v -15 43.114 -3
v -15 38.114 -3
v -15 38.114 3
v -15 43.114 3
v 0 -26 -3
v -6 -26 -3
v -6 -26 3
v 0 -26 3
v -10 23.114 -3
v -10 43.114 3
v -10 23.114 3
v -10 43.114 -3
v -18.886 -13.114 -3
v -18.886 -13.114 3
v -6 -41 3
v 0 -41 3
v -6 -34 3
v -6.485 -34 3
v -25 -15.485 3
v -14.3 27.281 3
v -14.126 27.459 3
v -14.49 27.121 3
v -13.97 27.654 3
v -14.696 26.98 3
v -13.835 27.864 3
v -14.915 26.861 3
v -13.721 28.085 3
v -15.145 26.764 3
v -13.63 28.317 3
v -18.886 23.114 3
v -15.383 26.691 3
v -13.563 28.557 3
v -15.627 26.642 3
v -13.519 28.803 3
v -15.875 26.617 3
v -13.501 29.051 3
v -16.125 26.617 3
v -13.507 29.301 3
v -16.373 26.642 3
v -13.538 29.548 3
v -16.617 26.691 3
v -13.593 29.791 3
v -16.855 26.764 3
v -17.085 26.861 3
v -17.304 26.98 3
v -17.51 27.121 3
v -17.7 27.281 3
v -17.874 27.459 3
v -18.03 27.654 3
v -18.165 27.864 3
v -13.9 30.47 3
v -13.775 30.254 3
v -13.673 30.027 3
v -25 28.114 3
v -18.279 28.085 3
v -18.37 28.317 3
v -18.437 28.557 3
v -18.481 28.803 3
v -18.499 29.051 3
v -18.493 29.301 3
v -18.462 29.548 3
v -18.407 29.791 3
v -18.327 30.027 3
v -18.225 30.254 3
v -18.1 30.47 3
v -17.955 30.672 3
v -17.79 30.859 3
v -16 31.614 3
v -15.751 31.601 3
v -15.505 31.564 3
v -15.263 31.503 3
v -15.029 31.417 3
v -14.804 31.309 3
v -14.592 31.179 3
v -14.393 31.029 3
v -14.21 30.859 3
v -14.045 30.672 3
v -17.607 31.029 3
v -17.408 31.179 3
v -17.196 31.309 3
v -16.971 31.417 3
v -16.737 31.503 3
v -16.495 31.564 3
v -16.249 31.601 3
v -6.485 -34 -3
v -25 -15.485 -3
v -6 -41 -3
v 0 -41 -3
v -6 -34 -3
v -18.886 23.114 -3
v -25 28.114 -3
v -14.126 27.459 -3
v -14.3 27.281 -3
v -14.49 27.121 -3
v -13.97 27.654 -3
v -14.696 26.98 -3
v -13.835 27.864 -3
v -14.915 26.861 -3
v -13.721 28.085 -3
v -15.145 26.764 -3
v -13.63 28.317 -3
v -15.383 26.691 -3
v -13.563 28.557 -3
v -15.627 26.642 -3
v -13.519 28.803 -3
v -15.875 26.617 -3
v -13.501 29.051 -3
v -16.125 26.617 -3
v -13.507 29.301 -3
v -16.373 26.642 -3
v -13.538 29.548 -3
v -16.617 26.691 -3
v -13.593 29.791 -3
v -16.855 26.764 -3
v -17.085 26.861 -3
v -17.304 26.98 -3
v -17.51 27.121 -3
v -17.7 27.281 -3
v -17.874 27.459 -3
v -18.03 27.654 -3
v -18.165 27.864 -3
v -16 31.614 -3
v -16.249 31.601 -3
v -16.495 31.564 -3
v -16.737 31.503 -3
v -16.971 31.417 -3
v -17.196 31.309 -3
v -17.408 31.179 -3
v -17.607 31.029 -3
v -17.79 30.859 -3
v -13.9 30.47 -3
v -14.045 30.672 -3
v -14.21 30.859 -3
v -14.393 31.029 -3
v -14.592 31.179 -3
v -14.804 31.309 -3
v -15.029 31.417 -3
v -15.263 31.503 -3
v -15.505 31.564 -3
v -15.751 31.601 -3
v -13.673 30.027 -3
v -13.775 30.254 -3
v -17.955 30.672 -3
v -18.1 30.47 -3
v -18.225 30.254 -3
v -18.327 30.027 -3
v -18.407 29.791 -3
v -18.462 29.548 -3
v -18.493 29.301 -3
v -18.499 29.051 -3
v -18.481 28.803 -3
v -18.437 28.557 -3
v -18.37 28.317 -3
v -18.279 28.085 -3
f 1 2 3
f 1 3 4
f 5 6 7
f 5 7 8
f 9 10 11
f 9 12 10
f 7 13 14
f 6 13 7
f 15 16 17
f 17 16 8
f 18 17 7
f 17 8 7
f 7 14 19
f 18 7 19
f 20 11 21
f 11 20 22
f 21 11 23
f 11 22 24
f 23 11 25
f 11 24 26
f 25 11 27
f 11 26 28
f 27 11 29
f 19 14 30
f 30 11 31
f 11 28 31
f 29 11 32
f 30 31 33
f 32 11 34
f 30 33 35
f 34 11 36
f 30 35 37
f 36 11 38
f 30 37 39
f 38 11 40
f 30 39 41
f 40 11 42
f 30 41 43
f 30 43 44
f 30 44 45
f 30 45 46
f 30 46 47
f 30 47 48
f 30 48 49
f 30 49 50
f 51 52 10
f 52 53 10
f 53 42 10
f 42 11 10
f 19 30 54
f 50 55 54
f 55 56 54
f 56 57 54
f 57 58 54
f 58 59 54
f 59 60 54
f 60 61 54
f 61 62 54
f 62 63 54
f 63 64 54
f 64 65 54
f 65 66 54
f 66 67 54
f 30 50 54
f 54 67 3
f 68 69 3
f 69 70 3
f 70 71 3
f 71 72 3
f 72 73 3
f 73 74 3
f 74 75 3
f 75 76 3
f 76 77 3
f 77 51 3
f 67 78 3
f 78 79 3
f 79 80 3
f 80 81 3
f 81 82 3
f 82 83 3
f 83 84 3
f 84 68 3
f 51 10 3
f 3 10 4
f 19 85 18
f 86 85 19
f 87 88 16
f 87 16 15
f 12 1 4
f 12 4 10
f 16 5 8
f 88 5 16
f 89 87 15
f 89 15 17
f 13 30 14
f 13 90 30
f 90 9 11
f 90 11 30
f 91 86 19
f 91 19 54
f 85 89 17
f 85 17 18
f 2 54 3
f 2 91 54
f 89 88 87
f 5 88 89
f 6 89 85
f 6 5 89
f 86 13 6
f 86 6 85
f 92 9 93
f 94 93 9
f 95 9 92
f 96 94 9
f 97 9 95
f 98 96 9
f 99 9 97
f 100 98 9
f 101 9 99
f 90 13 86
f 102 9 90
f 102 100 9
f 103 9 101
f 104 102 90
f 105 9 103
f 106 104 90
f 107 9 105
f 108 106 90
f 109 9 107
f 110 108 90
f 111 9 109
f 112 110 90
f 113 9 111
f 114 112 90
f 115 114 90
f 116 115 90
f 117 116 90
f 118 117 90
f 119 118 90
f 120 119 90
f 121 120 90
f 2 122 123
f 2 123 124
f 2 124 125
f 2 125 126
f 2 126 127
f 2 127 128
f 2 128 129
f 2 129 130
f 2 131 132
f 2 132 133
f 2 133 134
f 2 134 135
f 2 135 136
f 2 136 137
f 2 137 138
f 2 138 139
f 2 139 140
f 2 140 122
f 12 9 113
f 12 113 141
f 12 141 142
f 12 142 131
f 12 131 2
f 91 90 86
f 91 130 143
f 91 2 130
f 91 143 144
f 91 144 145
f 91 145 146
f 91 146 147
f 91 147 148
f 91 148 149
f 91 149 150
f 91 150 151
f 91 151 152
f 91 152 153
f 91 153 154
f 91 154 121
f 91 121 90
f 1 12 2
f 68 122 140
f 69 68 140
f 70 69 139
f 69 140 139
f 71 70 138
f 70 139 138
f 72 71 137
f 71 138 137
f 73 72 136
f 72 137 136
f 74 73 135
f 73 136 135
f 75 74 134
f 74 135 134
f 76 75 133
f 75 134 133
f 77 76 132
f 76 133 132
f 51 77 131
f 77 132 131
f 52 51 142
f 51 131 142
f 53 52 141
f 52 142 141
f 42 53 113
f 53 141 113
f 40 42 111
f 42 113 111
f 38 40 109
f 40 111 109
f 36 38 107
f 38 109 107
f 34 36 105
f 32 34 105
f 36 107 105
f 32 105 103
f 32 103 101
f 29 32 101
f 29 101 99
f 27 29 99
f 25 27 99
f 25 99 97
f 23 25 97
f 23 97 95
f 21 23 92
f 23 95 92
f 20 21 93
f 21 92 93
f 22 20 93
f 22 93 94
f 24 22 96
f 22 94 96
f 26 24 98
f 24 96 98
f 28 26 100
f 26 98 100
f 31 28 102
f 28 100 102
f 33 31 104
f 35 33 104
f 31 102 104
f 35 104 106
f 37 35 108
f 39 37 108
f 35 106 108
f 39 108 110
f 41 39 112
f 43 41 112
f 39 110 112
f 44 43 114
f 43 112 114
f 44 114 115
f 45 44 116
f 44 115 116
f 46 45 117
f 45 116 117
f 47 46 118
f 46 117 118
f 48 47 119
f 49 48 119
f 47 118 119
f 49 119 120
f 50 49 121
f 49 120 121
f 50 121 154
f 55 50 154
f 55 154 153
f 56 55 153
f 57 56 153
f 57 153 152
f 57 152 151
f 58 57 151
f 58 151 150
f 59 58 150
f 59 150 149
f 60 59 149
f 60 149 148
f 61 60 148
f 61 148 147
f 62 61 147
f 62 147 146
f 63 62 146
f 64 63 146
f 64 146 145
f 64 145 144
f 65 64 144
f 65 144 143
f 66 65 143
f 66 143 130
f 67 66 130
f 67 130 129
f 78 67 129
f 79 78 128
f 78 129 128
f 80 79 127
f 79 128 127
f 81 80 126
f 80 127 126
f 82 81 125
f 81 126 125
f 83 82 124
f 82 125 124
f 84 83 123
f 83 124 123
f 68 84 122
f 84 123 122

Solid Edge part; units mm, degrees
sketch "Sketch1" plane through (0, 0, 0) normal (0, 0, 1) x (1, 0, 0)
  line L0 (0, 34) -> (0, 26)
  line L1 (0, 26) -> (-6, 26)
  line L2 (-6, 26) -> (-18.8863, 13.1137)
  line L3 (-18.8863, 13.1137) -> (-18.8863, -13.1137)
  line L4 (-18.8863, -13.1137) -> (-6, -26)
  line L5 (-6, -26) -> (0, -26)
  line L6 (0, -26) -> (0, -34)
  line L7 (0, -34) -> (-6.4853, -34)
  line L8 (-6.4853, -34) -> (-25, -15.4853)
  line L9 (-25, -15.4853) -> (-25, 15.4853)
  line L10 (-25, 15.4853) -> (-6.4853, 34)
  line L11 (-6.4853, 34) -> (0, 34)
  dimension "D1" = 6
  dimension "D2" = 6
  dimension "D3" = 8
  dimension "D4" = 25
  dimension "D5" = 52
extrude "Protrusion1" add sketch "Sketch1" along normal mid plane 6
sketch "Sketch2" plane through (0, 0, 0) normal (0, 0, 1) x (1, 0, 0)
  line L0 (-6, -26) -> (0, -26)
  line L1 (0, -26) -> (0, -41)
  line L2 (0, -41) -> (-6, -41)
  line L3 (-6, -41) -> (-6, -26)
  dimension "D1" = 15
extrude "ExtrudedProtrusion_2" add sketch "Sketch2" along normal mid plane 6
sketch "Sketch3" plane through (-12.2288, -3.5, -3) normal (0, 0, -1) x (0, 1, 0)
  line L0 (16.6137, -6.6575) -> (16.6137, -12.7712)
  line L1 (16.6137, -12.7712) -> (18.9853, -12.7712)
  line L2 (18.9853, -12.7712) -> (37.5, 5.7435)
  line L3 (37.5, 5.7435) -> (37.5, 12.2288)
  line L4 (37.5, 12.2288) -> (29.5, 12.2288)
  line L5 (29.5, 12.2288) -> (29.5, 6.2288)
  line L6 (29.5, 6.2288) -> (16.6137, -6.6575)
extrude "Cutout1" cut sketch "Sketch3" against normal through all
sketch "Sketch4" plane through (0, 0, 0) normal (0, 0, 1) x (1, 0, 0)
  line L0 (-18.8863, 13.1137) -> (-25, 13.1137)
  line L1 (-25, 13.1137) -> (-25, 28.1137)
  line L2 (-25, 28.1137) -> (-15, 38.1137)
  line L3 (-15, 38.1137) -> (-15, 43.1137)
  line L4 (-15, 43.1137) -> (-10, 43.1137)
  line L5 (-10, 43.1137) -> (-10, 23.1137)
  line L6 (-10, 23.1137) -> (-18.8863, 23.1137)
  line L7 (-18.8863, 23.1137) -> (-18.8863, 13.1137)
  dimension "D1" = 30
  dimension "D2" = 10
  dimension "D3" = 15
  dimension "D4" = 15
  dimension "D5" = 5
extrude "ExtrudedProtrusion_3" add sketch "Sketch4" along normal mid plane 6
hole "Hole_1" at (-16, 29.1137, -3) direction (0, 0, 1) diameter 5 end up to next
properties material "Polyethylene, low density"
